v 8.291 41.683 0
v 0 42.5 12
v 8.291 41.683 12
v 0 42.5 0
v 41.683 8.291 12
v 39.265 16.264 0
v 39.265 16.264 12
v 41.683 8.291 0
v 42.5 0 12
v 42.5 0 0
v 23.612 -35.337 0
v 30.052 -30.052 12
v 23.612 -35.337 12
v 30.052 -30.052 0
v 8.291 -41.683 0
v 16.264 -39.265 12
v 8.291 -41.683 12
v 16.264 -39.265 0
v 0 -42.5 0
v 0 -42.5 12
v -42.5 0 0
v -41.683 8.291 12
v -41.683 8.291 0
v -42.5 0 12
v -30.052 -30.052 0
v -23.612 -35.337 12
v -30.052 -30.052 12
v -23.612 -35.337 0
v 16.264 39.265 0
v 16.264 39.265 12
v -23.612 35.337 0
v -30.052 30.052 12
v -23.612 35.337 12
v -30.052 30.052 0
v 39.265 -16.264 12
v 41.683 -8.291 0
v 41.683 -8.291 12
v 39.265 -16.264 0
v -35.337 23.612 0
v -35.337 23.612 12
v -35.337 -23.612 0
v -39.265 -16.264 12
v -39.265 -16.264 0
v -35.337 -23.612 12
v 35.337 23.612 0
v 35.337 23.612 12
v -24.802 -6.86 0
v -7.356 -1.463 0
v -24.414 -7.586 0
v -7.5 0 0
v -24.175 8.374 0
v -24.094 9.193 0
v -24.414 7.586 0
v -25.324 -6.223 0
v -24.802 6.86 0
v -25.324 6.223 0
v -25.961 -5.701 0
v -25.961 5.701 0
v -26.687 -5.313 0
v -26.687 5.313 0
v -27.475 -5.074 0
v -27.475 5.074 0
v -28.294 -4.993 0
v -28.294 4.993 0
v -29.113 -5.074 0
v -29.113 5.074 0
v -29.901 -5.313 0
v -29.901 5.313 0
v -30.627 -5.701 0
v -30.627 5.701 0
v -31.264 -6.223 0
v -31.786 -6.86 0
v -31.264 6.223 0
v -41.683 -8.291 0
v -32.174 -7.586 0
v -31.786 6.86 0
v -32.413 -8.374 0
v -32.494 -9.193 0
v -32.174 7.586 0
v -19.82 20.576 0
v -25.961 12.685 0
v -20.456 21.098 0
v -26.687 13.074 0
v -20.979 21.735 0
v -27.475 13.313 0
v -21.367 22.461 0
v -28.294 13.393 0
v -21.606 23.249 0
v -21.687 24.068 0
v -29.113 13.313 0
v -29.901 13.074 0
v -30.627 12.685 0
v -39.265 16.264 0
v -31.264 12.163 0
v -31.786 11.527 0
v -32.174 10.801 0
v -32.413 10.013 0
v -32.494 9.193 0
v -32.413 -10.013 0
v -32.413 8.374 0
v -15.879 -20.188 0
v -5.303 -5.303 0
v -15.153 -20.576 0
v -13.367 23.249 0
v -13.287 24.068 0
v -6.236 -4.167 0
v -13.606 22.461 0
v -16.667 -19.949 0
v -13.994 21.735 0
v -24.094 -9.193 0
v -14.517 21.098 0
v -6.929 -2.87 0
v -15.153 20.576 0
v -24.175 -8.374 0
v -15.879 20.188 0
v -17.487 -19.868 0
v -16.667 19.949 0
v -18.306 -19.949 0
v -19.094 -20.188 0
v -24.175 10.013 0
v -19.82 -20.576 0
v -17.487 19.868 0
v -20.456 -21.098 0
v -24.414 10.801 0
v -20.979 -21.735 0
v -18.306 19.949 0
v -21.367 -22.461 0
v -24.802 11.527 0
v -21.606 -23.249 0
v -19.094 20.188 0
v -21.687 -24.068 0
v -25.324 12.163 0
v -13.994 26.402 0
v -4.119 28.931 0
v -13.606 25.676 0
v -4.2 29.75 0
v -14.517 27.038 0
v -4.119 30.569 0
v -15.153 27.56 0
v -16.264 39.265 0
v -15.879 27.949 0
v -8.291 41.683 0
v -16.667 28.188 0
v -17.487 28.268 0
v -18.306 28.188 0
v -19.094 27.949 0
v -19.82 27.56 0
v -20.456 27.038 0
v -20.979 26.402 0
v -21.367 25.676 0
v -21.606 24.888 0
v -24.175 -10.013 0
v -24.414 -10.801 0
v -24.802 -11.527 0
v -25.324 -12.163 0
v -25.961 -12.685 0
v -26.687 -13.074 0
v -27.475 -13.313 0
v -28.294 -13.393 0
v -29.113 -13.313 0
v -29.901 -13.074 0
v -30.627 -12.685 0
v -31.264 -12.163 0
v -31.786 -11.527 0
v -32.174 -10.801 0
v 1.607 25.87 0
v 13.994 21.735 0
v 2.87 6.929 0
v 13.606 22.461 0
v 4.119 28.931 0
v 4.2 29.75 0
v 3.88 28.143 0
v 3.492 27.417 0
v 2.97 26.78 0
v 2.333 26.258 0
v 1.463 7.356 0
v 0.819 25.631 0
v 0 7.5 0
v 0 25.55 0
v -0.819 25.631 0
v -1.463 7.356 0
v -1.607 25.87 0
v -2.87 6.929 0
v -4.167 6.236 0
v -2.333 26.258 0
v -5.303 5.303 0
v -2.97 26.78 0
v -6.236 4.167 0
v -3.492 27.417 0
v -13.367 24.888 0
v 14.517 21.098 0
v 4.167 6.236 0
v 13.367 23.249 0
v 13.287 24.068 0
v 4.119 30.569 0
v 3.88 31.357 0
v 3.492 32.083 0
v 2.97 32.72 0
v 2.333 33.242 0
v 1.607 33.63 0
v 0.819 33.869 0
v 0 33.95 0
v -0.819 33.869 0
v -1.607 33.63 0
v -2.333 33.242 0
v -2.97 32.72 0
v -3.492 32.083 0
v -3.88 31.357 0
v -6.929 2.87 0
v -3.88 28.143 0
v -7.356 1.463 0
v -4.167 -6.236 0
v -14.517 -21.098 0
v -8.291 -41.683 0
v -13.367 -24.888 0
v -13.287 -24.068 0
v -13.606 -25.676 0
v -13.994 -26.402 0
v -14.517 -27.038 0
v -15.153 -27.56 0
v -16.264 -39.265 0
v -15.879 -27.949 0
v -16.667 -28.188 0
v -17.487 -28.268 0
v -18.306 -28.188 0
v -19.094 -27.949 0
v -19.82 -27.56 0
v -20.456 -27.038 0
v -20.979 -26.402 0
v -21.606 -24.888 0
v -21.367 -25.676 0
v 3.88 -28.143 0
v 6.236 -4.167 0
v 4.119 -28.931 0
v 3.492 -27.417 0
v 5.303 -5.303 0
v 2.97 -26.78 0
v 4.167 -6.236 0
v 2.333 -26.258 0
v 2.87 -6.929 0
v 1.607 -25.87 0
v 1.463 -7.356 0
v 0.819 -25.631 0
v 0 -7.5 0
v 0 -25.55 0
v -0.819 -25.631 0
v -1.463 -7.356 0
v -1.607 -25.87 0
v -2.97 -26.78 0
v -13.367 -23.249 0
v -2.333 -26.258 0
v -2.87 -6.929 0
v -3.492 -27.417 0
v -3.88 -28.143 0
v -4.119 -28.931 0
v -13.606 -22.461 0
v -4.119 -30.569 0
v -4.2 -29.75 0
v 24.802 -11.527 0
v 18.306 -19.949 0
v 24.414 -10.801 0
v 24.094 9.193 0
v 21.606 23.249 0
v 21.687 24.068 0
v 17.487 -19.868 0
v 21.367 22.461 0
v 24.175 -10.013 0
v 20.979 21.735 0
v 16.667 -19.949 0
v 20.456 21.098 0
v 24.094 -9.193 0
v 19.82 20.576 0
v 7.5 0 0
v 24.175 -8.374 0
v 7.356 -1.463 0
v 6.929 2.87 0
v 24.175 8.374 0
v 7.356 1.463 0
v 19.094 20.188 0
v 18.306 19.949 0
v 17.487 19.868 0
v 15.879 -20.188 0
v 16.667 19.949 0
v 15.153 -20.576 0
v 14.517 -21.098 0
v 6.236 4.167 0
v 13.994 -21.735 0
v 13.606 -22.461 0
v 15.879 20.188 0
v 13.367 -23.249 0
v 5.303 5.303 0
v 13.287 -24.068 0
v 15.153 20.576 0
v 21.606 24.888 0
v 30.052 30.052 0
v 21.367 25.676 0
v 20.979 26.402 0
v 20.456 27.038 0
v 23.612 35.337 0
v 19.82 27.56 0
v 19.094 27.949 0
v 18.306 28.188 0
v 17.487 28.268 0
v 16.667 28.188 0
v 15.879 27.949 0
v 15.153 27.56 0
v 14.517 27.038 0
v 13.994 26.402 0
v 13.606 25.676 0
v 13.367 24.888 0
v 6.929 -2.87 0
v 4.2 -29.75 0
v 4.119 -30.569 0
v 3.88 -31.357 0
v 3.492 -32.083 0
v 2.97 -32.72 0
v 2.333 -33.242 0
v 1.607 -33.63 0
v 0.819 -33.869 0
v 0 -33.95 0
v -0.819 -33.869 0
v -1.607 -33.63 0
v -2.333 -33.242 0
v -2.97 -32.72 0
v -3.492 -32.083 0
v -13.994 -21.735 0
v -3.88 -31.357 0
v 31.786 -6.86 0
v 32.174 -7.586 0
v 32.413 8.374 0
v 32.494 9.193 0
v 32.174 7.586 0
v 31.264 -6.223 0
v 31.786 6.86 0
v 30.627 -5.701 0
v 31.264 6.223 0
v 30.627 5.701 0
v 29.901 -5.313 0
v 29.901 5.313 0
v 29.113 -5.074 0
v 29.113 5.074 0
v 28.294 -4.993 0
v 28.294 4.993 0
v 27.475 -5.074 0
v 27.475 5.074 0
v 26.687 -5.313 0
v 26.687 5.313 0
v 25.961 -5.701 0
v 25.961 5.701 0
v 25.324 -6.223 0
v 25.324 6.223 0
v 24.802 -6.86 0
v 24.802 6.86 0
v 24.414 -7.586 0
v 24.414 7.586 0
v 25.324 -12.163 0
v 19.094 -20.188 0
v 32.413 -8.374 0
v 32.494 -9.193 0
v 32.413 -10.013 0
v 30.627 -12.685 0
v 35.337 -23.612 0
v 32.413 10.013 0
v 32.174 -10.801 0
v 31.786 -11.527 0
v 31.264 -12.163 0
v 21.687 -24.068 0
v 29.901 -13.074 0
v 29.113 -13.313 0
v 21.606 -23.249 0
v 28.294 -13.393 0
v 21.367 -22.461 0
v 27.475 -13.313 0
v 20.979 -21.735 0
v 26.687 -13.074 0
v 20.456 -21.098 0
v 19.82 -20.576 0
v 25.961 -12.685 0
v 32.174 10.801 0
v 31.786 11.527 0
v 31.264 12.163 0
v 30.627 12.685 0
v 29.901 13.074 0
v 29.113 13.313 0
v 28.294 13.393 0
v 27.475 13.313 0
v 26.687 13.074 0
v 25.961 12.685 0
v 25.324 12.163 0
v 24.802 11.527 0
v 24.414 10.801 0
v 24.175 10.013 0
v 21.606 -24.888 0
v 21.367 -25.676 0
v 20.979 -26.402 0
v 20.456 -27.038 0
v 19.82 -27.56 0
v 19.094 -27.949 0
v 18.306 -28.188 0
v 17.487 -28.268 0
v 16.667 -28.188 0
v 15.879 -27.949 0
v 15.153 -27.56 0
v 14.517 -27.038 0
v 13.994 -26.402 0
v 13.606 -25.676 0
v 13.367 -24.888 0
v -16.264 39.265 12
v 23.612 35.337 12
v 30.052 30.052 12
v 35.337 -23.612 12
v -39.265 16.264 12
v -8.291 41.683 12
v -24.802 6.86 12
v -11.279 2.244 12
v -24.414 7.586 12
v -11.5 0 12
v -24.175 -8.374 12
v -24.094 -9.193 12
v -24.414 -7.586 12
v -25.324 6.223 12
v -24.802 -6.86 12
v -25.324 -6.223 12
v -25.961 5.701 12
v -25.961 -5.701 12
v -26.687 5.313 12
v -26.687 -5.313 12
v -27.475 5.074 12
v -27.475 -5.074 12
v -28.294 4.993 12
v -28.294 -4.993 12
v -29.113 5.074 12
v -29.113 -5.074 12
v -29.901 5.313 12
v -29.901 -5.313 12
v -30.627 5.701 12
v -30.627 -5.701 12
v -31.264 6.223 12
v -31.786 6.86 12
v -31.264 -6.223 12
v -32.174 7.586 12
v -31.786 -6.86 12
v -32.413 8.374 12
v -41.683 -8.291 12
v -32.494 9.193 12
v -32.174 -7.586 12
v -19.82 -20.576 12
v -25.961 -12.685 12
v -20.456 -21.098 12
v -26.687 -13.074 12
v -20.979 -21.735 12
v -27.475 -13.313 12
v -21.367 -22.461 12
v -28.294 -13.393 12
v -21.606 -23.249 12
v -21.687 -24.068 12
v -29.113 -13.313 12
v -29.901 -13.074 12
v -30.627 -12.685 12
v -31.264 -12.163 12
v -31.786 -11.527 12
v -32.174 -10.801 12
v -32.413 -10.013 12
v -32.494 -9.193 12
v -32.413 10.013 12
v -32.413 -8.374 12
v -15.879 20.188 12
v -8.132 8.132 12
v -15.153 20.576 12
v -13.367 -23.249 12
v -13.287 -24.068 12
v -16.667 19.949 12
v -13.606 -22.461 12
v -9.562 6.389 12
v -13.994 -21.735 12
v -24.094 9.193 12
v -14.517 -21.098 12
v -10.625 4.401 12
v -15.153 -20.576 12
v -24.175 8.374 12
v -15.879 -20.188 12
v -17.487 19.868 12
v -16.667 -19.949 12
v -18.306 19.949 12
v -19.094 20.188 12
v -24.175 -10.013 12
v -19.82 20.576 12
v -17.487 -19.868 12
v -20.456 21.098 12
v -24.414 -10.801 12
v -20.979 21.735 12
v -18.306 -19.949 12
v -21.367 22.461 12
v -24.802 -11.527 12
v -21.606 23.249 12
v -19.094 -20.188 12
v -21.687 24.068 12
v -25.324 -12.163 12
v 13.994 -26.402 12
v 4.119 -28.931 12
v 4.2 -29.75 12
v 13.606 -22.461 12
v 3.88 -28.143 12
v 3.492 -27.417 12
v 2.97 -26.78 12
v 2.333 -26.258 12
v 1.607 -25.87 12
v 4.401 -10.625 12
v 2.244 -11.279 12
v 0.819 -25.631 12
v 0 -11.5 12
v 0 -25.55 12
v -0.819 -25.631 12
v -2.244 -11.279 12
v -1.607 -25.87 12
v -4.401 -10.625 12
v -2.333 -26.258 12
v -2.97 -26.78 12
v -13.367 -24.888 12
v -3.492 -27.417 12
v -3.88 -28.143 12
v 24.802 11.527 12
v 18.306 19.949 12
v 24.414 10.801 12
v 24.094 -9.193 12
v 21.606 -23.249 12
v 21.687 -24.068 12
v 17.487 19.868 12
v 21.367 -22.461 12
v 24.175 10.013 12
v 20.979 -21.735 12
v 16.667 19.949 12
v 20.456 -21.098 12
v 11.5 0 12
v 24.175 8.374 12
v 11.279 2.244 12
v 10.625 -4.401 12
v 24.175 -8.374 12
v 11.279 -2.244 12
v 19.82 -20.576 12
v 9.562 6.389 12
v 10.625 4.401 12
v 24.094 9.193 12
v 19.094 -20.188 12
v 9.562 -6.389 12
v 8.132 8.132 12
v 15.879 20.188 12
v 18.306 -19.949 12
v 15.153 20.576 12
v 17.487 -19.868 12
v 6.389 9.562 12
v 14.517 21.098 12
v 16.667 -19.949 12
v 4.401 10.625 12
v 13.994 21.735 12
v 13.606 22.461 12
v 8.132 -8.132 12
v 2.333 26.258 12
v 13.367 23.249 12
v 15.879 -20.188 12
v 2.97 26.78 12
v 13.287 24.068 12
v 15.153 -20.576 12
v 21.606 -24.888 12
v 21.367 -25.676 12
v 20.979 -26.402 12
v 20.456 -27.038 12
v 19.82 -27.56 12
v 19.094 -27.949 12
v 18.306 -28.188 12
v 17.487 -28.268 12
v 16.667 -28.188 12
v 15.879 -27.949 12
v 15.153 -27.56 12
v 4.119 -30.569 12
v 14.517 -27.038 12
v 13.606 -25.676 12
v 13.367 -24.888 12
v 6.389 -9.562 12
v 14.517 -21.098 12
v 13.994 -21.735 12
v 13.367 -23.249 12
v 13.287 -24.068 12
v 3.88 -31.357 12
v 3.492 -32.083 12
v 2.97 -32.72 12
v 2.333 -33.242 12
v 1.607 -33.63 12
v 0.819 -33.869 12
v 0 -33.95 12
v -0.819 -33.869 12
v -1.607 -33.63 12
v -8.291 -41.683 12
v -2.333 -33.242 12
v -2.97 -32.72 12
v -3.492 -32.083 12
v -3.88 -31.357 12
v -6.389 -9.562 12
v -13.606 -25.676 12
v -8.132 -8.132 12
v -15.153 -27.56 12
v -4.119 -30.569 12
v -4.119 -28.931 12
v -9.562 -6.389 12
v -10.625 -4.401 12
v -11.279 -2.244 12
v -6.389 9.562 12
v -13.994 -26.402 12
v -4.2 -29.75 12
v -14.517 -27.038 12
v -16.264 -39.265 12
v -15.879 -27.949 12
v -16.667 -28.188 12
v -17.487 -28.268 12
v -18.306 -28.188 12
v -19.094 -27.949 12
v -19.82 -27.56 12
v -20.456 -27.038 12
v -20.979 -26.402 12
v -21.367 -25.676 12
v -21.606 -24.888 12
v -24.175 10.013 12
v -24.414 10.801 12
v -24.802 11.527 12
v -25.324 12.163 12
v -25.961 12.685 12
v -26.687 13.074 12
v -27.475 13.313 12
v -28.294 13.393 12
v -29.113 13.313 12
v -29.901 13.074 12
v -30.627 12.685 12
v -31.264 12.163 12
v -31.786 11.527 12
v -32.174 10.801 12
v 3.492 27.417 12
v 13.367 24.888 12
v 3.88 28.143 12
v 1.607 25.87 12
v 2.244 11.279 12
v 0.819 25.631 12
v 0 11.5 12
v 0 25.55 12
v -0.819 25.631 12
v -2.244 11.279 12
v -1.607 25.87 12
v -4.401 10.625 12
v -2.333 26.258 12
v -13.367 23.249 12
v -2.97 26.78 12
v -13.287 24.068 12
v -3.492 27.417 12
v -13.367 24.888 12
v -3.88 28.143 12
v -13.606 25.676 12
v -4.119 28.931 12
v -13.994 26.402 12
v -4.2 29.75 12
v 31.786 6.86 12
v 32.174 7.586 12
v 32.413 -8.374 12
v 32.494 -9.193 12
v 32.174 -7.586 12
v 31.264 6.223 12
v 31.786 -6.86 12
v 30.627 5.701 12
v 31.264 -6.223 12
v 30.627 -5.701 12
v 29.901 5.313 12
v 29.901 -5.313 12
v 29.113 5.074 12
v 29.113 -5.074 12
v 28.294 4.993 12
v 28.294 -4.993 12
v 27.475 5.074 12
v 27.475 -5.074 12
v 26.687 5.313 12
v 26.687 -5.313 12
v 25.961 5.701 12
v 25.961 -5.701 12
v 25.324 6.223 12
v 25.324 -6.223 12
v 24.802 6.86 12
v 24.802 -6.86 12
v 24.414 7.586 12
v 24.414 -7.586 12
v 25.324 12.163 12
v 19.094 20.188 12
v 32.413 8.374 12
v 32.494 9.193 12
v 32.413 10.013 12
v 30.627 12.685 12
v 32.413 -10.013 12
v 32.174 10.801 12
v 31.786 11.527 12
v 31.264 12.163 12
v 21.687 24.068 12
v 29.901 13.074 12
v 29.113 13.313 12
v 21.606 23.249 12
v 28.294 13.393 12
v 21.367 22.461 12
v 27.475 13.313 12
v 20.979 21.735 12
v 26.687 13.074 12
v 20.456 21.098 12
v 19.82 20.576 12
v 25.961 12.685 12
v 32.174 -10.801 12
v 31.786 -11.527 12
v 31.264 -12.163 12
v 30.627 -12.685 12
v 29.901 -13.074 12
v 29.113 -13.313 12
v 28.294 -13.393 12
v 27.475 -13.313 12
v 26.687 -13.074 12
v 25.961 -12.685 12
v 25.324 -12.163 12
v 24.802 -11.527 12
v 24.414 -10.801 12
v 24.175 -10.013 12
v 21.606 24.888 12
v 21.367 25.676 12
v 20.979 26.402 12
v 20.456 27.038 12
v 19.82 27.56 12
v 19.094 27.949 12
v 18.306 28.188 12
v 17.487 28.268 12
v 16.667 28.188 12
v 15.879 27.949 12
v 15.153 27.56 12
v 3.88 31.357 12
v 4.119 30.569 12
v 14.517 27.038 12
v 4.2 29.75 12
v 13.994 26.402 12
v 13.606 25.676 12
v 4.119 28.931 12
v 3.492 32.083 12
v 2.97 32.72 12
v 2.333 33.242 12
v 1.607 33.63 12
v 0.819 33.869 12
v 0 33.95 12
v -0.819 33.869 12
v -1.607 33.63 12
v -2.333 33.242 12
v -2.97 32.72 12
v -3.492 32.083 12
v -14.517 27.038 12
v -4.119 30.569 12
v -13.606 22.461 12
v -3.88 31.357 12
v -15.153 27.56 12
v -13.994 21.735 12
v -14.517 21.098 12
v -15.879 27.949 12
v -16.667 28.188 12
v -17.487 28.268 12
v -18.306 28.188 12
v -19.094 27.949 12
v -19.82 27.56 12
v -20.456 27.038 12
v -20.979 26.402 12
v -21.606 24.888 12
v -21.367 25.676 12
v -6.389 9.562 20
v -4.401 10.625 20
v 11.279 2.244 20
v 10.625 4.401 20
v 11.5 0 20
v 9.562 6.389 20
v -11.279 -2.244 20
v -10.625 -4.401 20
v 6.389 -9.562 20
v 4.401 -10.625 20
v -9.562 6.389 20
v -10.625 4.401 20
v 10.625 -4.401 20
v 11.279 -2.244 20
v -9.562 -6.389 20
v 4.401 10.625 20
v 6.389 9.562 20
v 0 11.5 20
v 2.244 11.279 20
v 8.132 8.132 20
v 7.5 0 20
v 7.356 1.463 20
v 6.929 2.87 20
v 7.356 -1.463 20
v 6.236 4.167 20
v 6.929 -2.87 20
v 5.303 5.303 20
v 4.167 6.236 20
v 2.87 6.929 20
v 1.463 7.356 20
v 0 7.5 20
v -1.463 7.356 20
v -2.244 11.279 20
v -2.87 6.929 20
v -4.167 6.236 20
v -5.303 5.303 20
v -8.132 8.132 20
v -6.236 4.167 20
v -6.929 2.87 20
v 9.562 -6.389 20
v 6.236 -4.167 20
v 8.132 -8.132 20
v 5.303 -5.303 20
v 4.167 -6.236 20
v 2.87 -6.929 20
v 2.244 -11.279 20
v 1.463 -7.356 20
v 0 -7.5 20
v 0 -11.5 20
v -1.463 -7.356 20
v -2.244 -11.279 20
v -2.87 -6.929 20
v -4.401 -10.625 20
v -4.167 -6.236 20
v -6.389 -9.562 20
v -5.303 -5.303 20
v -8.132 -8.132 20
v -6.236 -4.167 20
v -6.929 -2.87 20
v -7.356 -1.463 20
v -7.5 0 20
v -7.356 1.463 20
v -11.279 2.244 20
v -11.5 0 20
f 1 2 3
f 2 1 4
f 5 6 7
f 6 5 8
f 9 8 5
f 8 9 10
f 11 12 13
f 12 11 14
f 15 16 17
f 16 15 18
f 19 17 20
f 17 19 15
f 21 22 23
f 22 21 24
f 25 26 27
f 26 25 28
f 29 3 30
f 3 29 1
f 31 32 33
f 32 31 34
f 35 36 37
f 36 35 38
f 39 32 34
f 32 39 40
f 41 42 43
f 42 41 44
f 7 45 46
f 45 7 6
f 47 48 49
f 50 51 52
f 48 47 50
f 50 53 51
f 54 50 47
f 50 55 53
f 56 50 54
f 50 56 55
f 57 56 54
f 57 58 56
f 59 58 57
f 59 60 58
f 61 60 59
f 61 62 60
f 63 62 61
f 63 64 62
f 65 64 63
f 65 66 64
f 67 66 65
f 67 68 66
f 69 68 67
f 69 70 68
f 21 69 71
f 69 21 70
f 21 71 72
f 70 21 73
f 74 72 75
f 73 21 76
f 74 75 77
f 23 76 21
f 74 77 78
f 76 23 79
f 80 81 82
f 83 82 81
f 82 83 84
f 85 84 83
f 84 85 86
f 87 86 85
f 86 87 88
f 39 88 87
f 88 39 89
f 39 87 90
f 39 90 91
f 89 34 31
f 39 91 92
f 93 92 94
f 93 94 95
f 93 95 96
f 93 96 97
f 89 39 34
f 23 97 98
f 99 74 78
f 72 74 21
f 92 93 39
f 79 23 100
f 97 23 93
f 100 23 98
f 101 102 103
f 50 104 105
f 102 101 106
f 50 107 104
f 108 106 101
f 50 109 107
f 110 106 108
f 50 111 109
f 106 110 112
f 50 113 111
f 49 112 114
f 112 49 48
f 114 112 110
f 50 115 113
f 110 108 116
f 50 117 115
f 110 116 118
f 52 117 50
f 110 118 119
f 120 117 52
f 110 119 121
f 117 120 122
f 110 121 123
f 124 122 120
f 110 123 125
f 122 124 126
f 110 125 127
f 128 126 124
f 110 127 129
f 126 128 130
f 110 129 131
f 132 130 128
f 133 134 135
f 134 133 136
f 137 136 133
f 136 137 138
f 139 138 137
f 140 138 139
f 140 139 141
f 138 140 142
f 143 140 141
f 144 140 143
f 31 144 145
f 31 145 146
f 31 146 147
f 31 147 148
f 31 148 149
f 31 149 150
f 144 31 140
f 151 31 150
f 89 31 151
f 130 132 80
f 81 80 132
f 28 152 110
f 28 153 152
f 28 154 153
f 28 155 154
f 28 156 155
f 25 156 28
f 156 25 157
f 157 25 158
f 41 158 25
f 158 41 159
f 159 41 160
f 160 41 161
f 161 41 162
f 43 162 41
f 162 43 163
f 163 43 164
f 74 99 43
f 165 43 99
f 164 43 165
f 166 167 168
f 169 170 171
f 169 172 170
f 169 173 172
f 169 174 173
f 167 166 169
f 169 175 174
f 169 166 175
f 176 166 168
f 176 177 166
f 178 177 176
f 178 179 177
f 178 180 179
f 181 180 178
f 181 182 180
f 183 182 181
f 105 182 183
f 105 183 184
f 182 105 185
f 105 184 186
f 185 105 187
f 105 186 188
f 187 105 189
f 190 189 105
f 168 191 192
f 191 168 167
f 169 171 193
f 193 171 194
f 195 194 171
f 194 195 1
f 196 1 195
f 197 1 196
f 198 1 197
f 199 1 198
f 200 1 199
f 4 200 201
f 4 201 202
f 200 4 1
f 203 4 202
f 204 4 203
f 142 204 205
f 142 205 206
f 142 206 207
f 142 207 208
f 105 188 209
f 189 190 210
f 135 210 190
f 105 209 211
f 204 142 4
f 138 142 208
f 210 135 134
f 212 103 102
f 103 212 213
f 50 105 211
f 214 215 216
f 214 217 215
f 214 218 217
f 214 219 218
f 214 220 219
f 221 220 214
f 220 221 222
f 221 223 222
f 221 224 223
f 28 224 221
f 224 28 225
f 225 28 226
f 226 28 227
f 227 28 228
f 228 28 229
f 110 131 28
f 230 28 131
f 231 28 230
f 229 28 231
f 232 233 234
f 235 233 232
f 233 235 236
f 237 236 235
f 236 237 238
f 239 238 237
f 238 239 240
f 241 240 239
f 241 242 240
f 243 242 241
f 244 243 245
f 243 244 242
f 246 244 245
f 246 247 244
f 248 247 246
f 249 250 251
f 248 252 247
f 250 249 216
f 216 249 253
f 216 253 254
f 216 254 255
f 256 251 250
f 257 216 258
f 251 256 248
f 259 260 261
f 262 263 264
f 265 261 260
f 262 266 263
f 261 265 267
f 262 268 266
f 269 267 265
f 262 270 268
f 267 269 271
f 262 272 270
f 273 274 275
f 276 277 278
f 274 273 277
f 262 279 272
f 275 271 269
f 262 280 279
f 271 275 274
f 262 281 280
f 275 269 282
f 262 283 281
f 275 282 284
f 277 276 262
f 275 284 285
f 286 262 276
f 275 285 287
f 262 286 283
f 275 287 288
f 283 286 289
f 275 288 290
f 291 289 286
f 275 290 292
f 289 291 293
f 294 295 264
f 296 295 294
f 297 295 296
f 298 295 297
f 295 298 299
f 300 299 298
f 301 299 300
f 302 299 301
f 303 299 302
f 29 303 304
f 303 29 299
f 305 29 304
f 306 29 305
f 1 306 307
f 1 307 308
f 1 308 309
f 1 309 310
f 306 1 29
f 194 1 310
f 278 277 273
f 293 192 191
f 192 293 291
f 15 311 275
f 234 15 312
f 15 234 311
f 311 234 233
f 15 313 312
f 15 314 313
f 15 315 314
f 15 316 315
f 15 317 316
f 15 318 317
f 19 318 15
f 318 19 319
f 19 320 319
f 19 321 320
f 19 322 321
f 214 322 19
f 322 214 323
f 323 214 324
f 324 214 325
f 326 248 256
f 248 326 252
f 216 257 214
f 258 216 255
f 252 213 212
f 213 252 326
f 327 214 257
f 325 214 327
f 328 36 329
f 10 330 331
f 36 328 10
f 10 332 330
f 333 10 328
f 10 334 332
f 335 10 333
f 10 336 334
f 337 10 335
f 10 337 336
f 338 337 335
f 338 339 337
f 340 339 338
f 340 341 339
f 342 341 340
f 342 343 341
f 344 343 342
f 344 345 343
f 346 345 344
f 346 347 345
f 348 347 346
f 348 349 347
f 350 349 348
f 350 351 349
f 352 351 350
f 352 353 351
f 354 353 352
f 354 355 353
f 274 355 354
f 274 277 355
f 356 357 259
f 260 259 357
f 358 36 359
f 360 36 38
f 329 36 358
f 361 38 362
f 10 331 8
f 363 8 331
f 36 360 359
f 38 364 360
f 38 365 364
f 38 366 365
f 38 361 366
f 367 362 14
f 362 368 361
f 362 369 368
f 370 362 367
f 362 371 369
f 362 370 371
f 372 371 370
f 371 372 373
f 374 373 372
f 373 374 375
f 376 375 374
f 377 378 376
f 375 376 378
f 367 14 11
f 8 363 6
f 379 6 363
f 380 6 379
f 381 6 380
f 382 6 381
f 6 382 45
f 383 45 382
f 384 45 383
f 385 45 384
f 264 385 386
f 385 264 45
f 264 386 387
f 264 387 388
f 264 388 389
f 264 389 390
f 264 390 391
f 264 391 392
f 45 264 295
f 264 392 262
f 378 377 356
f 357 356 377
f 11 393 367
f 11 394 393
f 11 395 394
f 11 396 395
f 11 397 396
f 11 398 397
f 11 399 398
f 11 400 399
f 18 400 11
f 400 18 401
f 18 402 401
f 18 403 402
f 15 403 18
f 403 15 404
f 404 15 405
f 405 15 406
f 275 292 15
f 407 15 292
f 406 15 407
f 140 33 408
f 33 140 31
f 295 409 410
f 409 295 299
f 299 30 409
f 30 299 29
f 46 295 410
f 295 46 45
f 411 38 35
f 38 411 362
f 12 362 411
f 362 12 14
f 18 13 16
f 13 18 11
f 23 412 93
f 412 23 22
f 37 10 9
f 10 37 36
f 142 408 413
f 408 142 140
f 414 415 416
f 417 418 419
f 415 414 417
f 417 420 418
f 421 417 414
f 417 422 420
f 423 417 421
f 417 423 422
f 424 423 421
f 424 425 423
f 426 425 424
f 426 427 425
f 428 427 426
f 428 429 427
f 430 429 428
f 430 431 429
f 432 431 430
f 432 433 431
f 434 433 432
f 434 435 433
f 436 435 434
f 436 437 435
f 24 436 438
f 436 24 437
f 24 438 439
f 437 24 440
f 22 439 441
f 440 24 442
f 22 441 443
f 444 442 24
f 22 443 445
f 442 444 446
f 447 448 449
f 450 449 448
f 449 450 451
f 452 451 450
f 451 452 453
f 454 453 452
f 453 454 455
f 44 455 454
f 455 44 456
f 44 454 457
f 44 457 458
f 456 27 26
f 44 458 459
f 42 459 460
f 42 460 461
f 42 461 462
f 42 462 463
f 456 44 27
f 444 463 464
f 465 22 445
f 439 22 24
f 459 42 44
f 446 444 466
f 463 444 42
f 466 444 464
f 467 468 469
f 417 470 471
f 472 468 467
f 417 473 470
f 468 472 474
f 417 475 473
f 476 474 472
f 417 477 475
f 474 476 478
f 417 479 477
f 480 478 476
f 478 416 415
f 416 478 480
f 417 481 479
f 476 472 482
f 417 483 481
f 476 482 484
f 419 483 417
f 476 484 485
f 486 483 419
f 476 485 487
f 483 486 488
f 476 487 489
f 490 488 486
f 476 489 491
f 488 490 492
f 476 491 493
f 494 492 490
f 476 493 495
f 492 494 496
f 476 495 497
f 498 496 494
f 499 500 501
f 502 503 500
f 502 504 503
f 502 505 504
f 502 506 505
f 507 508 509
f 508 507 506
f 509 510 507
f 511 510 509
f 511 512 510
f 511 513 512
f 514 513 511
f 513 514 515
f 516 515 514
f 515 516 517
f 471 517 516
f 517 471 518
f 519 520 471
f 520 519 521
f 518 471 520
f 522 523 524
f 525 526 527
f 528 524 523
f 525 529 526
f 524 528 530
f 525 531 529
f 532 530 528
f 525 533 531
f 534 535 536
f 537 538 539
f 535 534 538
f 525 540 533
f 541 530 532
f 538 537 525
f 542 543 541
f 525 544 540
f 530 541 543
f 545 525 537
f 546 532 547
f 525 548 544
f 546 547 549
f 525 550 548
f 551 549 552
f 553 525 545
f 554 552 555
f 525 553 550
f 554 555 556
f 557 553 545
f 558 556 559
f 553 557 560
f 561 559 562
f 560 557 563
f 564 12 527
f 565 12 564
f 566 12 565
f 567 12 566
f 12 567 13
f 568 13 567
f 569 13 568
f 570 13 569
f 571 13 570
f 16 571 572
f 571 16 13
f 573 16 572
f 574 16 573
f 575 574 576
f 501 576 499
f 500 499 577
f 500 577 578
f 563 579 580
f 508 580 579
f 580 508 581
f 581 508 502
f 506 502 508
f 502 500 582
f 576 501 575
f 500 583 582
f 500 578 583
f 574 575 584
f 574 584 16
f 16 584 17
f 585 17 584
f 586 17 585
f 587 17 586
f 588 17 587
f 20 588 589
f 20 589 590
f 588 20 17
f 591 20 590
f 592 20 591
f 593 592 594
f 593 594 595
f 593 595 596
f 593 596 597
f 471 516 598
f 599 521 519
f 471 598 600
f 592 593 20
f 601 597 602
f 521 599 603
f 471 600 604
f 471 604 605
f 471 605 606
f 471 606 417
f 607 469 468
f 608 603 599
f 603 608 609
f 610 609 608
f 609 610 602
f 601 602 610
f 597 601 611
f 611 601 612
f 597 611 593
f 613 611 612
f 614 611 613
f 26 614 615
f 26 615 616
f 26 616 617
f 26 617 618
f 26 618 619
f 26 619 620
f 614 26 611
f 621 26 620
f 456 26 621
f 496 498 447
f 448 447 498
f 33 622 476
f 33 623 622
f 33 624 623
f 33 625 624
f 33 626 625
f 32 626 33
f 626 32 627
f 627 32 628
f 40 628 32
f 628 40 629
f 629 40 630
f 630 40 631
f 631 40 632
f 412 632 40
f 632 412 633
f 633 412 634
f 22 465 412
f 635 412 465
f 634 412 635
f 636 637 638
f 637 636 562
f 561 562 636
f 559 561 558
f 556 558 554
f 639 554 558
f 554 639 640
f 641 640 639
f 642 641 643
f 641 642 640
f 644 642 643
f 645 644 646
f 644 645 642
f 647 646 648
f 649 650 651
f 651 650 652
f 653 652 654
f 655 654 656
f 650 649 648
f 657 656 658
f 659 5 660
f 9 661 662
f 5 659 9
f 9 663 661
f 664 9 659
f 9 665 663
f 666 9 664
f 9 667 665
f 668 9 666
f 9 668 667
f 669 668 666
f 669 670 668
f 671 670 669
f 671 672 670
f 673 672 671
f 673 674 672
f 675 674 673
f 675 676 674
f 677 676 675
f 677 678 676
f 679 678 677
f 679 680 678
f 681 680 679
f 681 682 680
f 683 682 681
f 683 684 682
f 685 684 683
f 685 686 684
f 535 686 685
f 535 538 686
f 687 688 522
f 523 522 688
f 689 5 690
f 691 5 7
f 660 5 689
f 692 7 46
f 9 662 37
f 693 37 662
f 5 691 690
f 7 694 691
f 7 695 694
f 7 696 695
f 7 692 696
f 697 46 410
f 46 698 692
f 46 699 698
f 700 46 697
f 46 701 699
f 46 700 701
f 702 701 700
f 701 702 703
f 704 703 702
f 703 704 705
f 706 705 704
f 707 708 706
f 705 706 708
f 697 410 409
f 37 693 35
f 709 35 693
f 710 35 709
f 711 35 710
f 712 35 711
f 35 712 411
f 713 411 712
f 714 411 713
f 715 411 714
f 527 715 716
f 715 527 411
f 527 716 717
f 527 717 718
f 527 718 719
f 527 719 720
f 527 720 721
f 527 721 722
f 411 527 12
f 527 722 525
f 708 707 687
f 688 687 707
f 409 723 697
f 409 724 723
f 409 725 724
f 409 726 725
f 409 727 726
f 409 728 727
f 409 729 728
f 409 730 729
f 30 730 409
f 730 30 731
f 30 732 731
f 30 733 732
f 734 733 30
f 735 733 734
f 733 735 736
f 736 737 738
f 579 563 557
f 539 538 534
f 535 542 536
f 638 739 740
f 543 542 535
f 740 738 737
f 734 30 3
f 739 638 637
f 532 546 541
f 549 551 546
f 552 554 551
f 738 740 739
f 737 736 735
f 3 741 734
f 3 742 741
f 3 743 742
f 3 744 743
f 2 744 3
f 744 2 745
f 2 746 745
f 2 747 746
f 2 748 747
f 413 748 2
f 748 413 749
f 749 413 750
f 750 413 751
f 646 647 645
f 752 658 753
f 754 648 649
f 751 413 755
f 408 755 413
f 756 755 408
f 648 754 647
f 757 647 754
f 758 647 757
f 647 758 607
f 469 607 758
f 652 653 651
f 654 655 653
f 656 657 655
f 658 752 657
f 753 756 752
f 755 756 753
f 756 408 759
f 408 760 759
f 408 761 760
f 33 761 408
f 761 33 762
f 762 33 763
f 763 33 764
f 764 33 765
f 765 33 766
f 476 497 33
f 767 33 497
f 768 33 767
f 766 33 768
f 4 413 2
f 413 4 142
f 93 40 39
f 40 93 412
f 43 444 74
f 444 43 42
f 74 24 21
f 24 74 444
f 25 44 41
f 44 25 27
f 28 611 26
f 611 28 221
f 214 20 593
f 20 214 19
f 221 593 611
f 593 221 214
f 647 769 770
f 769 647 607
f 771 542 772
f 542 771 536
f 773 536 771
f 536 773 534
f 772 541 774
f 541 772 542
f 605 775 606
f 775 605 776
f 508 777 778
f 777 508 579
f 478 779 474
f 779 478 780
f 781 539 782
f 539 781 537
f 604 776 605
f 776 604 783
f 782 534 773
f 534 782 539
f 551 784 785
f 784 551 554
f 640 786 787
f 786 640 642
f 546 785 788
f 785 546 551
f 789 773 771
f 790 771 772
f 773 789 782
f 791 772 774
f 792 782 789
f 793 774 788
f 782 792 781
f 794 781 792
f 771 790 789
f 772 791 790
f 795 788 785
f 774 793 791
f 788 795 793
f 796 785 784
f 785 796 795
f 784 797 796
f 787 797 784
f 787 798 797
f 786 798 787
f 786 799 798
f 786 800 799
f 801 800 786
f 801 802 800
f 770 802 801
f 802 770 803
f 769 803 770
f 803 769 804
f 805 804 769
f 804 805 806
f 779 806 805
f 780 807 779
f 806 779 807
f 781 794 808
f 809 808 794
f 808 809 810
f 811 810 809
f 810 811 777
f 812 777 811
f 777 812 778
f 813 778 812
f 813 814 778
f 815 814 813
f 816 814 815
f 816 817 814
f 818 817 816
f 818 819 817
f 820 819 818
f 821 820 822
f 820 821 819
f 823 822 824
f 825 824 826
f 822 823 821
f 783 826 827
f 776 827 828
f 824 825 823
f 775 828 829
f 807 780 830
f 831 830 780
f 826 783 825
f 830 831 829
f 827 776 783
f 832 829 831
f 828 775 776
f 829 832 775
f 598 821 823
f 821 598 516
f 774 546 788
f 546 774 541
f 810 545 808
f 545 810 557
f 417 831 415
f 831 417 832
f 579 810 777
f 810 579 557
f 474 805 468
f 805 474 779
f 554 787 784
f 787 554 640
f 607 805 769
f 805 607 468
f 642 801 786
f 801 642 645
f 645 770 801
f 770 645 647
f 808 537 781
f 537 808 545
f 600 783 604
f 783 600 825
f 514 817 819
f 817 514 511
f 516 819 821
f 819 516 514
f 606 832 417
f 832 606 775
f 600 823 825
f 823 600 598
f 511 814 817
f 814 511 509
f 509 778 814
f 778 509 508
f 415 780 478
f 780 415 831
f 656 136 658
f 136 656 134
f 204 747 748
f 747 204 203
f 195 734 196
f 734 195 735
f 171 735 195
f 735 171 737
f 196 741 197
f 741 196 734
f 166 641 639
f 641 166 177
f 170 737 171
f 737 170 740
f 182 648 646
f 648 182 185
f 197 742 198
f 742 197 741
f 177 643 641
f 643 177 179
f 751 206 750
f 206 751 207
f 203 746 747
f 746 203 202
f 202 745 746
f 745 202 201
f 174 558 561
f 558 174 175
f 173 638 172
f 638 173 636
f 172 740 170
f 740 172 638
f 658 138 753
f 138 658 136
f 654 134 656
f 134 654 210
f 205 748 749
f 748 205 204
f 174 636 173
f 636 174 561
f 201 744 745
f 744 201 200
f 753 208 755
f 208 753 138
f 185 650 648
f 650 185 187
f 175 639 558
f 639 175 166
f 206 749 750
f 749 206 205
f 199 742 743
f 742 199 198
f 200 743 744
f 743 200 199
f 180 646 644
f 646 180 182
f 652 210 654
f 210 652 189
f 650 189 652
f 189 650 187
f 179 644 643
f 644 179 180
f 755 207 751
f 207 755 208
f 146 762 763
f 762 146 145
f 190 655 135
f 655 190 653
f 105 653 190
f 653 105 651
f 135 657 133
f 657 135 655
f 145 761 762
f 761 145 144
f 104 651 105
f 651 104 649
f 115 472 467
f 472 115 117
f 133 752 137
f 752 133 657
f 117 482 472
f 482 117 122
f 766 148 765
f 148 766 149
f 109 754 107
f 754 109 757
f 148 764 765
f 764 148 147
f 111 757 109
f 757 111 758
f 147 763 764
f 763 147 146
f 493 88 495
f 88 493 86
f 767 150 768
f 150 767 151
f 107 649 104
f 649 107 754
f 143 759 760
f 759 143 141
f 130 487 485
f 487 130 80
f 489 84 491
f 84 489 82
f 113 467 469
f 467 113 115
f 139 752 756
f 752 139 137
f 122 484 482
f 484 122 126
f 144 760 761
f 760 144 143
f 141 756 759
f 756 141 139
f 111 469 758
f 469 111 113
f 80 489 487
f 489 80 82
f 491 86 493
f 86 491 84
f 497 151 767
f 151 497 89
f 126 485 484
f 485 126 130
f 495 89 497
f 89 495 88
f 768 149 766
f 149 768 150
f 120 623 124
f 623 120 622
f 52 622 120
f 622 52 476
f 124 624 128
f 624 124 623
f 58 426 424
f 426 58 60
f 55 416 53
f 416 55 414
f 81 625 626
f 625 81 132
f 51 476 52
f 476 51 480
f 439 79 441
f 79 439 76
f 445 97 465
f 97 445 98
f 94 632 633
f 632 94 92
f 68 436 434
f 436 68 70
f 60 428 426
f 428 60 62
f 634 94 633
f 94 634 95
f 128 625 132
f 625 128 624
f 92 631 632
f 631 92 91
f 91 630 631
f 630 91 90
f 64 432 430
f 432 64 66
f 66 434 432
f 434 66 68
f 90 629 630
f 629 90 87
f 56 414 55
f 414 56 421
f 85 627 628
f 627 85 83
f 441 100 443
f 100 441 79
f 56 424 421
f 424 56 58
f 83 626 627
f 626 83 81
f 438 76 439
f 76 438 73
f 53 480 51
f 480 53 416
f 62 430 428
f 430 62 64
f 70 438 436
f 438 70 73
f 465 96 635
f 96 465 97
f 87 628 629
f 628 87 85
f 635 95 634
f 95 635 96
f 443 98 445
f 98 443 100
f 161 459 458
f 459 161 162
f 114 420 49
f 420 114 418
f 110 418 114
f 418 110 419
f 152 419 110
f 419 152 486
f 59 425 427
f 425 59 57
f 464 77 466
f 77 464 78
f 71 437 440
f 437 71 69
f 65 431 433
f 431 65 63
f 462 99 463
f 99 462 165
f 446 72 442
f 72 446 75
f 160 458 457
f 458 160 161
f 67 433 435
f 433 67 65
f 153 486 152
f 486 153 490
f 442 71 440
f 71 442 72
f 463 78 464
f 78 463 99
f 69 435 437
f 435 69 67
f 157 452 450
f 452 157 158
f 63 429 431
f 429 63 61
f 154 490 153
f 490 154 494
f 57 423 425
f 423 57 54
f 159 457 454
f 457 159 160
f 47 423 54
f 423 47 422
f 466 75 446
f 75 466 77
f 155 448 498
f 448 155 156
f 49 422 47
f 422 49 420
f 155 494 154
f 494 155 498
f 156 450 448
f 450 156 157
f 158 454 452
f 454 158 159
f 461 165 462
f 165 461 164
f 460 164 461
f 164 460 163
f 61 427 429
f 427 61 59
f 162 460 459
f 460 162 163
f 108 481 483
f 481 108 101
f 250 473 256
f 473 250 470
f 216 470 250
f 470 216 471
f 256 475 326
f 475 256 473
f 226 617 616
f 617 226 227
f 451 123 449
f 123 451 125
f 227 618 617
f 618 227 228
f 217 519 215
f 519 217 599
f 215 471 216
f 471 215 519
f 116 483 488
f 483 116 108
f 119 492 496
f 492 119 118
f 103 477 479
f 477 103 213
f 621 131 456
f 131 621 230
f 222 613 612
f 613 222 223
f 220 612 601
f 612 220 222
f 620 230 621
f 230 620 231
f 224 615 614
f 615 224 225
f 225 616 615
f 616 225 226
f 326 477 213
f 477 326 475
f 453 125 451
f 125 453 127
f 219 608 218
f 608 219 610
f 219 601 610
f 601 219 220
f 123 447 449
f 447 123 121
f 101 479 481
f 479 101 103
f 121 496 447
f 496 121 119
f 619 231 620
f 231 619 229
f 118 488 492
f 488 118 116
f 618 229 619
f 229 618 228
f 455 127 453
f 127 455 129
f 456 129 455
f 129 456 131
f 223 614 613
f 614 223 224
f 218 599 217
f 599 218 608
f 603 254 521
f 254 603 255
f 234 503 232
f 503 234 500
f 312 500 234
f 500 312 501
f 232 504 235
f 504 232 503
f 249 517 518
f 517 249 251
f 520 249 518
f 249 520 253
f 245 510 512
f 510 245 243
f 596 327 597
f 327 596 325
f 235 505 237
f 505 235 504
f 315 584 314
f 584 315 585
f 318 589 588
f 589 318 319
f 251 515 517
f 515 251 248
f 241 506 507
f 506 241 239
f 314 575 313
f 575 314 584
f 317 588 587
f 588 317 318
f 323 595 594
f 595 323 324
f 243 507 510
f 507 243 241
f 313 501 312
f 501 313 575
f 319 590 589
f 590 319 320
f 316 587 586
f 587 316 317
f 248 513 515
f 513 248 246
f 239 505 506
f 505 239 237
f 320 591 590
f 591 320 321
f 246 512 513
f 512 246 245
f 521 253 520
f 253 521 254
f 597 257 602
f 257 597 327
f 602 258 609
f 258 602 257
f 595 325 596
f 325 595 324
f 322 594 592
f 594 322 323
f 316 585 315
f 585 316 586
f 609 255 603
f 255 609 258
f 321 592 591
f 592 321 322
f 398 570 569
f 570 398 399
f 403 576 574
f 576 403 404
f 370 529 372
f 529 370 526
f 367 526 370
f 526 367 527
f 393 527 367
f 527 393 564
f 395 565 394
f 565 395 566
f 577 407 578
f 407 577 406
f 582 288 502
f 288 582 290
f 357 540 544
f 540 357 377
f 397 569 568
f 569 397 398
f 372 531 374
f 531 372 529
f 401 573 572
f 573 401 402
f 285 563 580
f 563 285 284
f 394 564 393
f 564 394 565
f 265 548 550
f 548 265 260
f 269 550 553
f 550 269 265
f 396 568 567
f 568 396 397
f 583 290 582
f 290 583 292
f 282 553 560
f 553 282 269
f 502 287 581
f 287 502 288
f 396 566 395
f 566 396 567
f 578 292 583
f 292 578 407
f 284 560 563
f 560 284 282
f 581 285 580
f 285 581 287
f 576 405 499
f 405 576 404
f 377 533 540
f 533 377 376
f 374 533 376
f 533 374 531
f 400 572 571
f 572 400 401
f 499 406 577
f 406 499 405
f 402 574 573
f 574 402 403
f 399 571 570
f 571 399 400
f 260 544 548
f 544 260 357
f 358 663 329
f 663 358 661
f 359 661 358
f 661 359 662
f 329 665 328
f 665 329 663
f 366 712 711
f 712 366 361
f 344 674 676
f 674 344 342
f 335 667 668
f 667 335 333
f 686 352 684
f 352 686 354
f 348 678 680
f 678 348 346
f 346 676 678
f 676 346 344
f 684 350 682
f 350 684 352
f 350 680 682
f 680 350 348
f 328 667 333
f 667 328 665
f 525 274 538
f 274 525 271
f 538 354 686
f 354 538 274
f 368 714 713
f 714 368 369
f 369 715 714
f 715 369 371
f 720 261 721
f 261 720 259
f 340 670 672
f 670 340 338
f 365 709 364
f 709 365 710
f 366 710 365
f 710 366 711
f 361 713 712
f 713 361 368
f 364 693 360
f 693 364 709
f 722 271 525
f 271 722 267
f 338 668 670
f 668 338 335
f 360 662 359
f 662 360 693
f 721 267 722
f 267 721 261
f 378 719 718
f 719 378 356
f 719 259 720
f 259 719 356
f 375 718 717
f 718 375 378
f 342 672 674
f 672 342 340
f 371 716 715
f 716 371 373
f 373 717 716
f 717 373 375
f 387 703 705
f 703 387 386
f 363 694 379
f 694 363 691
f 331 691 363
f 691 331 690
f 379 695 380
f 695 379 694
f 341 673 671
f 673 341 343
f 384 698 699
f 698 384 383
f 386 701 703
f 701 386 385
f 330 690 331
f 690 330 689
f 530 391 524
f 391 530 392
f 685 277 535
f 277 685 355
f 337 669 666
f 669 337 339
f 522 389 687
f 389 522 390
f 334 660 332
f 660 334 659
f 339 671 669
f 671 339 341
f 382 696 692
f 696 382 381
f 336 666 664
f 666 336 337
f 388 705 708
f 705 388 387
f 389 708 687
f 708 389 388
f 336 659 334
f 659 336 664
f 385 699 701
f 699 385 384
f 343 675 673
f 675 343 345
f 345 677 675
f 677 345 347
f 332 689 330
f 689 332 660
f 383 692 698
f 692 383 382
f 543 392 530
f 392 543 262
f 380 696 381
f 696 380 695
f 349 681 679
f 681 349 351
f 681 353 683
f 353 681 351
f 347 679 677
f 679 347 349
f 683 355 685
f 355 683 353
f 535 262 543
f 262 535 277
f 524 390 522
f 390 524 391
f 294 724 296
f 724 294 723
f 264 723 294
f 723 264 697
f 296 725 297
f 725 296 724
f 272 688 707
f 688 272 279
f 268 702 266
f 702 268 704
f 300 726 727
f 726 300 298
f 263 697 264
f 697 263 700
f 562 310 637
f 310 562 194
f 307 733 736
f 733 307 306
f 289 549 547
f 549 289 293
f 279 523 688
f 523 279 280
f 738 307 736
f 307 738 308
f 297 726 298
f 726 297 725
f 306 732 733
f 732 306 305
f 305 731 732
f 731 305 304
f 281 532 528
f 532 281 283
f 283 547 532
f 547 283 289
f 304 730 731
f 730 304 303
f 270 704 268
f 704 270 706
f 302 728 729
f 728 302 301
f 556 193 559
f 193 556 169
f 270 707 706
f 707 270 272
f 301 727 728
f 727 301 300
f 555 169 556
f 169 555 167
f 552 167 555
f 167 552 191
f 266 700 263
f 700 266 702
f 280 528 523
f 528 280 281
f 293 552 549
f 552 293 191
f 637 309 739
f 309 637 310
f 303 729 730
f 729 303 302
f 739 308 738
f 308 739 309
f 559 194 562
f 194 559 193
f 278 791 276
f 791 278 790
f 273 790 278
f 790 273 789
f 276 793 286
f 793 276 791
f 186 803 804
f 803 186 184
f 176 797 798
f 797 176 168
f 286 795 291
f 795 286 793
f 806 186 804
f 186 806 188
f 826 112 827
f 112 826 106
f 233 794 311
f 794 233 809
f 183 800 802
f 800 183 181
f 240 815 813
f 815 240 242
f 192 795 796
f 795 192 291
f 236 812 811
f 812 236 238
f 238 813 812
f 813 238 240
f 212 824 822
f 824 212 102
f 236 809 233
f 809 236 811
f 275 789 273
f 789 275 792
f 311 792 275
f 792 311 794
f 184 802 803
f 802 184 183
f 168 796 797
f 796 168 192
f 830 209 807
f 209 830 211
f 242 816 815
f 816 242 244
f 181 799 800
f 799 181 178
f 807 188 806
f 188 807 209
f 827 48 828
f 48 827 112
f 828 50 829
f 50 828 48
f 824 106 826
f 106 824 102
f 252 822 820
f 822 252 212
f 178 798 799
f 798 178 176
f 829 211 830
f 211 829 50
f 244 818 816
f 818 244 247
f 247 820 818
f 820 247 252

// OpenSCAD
$fn = 32;

// ----------------------------------------------------------------------
// Flange Ø85 x 12
// 10 holes on a Ø59.5 bolt circle, bolted joints
// ----------------------------------------------------------------------

// --- parameters (mm) ---
flange_d = 85;   // outside diameter of the flange
thickness = 12;  // flange thickness
holes = 10;      // number of bolt holes
pcd = 59.5;      // bolt circle diameter
start_deg = 90;  // angle of the first hole, from +X
hole_d = 8.4;    // bolt hole diameter
bore_d = 15;     // central through bore
hub_d = 23;      // hub outside diameter
hub_h = 8;       // hub height above the flange face (0 = no hub)

// --- derived feature positions (mm) ---
height = thickness + hub_h;  // = 20   overall height of the part
pcd_r = pcd / 2;             // = 29.75   bolt circle radius
hole_step = 360 / holes;     // = 36   angular pitch
feature_centers = [
  [pcd_r * cos(start_deg + 0 * hole_step), pcd_r * sin(start_deg + 0 * hole_step)],
  [pcd_r * cos(start_deg + 1 * hole_step), pcd_r * sin(start_deg + 1 * hole_step)],
  [pcd_r * cos(start_deg + 2 * hole_step), pcd_r * sin(start_deg + 2 * hole_step)],
  [pcd_r * cos(start_deg + 3 * hole_step), pcd_r * sin(start_deg + 3 * hole_step)],
  [pcd_r * cos(start_deg + 4 * hole_step), pcd_r * sin(start_deg + 4 * hole_step)],
  [pcd_r * cos(start_deg + 5 * hole_step), pcd_r * sin(start_deg + 5 * hole_step)],
  [pcd_r * cos(start_deg + 6 * hole_step), pcd_r * sin(start_deg + 6 * hole_step)],
  [pcd_r * cos(start_deg + 7 * hole_step), pcd_r * sin(start_deg + 7 * hole_step)],
  [pcd_r * cos(start_deg + 8 * hole_step), pcd_r * sin(start_deg + 8 * hole_step)],
  [pcd_r * cos(start_deg + 9 * hole_step), pcd_r * sin(start_deg + 9 * hole_step)]
];   // bolt hole centres on the pitch circle

// flange disc, every hole and the bore cut straight through
difference() {
  union() {
    cylinder(d = flange_d, h = thickness);
    cylinder(d = hub_d, h = height);  // hub, overlapped into the flange
  }
  translate([0, 0, -1]) cylinder(d = bore_d, h = height + 2);  // bore, through
  for (centre = feature_centers)
    translate([centre[0], centre[1], -1]) cylinder(d = hole_d, h = thickness + 2);
}
